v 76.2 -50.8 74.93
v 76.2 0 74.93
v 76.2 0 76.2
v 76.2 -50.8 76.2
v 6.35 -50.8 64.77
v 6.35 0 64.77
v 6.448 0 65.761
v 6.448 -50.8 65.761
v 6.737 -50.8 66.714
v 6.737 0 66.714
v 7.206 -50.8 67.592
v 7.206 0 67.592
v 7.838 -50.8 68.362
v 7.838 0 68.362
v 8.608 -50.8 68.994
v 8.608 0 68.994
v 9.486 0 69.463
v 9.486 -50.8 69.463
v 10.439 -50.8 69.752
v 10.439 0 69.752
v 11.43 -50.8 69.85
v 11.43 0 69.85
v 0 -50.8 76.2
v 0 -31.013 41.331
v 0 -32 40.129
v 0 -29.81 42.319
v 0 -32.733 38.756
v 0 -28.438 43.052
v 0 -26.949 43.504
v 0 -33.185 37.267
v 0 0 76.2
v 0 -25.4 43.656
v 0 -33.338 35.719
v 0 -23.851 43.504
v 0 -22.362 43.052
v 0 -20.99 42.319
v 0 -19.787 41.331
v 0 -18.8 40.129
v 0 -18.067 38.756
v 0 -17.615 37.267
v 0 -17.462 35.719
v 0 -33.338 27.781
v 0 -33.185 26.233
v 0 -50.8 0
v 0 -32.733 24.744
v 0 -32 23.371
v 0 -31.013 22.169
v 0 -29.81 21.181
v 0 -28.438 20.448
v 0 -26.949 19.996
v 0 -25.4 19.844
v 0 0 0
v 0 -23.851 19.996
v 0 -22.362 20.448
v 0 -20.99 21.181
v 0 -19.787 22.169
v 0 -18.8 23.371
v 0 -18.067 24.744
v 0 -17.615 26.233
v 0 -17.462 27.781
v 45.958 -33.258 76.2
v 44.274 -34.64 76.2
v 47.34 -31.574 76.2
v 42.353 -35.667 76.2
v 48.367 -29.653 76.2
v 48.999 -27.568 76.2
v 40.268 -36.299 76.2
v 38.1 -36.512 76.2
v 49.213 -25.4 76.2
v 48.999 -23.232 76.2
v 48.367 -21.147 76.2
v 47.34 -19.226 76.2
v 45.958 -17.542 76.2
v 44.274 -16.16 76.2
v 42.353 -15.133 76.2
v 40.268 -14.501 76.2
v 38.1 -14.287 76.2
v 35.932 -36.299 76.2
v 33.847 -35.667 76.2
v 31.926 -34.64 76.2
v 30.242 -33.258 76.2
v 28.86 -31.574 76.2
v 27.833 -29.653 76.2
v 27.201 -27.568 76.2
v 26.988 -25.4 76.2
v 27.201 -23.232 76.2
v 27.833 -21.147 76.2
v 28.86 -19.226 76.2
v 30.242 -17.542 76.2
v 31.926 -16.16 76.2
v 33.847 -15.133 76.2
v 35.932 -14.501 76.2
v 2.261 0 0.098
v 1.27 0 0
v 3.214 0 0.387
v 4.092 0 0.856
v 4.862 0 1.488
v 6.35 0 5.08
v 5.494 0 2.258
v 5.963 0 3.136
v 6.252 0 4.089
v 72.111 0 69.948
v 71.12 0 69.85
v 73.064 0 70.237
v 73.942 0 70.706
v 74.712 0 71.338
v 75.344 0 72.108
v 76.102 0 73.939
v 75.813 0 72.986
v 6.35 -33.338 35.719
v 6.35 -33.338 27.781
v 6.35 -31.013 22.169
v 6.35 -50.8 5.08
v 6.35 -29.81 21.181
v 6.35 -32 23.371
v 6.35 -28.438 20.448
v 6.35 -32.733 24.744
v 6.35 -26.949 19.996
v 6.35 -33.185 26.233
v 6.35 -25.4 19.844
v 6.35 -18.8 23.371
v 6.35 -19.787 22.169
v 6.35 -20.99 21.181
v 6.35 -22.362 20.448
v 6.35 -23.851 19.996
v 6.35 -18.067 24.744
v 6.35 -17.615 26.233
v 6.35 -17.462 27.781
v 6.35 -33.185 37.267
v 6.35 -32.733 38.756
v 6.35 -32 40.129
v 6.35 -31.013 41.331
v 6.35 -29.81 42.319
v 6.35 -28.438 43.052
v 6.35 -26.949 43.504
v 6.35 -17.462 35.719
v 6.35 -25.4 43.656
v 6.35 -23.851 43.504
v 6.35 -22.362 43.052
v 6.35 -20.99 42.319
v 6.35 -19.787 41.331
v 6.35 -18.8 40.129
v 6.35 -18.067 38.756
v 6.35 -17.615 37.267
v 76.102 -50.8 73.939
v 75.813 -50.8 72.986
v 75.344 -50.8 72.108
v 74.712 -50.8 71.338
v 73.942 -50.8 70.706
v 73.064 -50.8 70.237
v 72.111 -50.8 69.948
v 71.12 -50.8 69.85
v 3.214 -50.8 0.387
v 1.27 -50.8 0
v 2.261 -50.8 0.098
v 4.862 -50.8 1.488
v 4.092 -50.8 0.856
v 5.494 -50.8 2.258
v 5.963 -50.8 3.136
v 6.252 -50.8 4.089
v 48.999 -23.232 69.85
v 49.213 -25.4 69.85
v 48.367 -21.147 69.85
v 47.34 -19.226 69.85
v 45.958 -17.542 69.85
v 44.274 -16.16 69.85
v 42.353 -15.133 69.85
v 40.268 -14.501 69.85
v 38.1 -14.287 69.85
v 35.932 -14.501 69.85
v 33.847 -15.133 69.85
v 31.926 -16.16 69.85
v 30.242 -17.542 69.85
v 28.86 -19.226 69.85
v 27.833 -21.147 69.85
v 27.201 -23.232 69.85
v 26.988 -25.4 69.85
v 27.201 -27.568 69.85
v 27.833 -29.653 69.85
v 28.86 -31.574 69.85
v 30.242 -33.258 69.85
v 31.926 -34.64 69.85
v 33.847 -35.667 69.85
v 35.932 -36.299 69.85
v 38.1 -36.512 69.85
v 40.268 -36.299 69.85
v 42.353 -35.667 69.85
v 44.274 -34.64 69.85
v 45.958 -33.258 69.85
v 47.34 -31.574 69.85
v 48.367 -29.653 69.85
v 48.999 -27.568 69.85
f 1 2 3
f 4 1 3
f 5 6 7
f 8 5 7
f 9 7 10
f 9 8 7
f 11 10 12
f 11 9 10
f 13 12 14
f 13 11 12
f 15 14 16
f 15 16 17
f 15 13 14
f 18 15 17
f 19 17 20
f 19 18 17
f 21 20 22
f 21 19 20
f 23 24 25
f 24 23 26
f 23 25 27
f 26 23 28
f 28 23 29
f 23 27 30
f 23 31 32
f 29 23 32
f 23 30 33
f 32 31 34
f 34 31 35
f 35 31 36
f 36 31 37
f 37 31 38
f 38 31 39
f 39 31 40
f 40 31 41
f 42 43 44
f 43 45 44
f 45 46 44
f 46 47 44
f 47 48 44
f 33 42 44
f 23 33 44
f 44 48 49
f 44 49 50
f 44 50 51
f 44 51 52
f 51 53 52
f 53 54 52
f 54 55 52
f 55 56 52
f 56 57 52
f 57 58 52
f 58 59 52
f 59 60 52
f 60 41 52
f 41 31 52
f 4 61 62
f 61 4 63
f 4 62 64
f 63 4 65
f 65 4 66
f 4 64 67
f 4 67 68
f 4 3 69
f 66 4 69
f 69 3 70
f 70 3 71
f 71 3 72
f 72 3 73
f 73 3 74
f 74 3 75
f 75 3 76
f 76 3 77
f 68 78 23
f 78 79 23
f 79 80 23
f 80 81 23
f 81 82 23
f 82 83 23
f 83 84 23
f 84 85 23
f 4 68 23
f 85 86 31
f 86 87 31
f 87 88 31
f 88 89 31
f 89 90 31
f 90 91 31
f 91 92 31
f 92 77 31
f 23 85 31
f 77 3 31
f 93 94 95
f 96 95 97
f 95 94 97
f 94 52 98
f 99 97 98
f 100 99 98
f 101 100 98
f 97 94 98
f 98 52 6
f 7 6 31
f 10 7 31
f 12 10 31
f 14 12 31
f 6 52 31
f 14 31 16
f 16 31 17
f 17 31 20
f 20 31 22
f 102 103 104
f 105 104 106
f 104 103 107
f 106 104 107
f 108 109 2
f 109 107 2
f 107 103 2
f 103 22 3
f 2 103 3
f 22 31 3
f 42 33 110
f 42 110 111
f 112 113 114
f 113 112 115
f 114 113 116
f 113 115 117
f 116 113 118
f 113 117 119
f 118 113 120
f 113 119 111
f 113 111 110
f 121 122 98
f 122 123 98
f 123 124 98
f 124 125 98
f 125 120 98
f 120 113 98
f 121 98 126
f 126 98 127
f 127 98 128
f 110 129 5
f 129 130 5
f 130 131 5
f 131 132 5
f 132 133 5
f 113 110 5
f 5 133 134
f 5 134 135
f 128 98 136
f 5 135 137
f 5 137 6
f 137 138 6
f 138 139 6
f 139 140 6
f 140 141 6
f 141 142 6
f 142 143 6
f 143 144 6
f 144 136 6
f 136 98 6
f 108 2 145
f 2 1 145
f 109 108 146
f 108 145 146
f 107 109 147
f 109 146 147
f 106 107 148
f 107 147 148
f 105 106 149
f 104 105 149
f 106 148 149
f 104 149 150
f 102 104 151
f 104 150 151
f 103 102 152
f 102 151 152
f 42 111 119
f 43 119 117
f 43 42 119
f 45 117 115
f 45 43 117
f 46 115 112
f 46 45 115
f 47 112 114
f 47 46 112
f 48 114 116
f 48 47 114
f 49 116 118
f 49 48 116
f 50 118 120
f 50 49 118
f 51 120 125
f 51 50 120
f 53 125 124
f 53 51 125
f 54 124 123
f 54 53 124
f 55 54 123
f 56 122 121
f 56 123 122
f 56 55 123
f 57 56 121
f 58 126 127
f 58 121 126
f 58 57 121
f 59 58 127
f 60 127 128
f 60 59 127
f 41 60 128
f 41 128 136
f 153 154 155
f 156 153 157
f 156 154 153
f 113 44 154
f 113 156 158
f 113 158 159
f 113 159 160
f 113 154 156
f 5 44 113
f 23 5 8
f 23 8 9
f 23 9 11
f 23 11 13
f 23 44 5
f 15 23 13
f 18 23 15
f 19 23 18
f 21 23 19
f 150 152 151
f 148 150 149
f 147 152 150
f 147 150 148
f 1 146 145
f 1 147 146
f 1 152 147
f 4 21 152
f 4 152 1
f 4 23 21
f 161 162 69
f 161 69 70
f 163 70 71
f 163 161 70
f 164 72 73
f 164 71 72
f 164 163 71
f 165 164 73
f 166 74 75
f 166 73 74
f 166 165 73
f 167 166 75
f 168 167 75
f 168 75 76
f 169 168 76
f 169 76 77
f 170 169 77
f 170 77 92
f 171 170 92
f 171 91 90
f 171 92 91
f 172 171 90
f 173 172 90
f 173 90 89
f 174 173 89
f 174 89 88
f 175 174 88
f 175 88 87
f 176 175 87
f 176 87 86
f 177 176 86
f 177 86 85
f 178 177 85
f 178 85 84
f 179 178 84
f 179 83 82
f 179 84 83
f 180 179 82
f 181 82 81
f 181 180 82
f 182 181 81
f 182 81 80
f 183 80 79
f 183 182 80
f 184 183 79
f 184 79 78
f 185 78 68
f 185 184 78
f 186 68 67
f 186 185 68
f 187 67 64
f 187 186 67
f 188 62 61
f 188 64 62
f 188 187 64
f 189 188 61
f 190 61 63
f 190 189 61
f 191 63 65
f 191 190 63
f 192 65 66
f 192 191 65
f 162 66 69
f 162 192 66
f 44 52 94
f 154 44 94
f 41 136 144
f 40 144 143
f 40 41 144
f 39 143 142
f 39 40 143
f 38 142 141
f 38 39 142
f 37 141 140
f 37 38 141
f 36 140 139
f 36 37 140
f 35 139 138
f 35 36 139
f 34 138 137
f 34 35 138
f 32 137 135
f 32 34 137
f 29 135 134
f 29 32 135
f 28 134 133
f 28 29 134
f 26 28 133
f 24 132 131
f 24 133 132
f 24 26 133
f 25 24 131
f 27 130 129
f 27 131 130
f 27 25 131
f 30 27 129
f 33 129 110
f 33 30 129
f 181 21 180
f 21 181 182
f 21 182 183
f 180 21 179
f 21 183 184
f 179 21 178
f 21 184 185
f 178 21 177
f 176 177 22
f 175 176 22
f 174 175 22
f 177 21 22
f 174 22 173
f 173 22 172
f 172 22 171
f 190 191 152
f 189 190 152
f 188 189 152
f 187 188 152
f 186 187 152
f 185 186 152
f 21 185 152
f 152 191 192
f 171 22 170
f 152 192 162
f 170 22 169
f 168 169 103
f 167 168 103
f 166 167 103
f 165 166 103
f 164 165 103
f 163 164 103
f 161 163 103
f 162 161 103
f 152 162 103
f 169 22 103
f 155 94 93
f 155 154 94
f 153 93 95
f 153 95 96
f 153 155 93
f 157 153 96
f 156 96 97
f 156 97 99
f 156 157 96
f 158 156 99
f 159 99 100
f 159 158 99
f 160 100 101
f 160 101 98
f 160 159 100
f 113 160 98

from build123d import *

# Parameters (mm, degrees)
F1_DEPTH  = 50.8
F3_DEPTH  = 76.201
F4_R      = 11.1125
F1_FACE_W = 76.2
F1_FACE_H = 50.8
F5_DEPTH  = 76.201
F6_R      = 5.08


with BuildPart() as f1:
    # F0 (on Front) → F1 (new body)
    with BuildSketch(Plane.XZ):
        Polygon((0, 76.2), (0, 0), (6.35, 0), (6.35, 69.85), (76.2, 69.85), (76.2, 76.2), align=None)
    extrude(amount=F1_DEPTH)

    # F2 (on Right) → F3 (cut, through all)
    with BuildSketch(Plane.YZ):
        with BuildLine():
            Line((-33.3375, 31.75), (-33.3375, 27.78125))
            ThreePointArc((-33.3375, 27.78125), (-25.4, 19.84375), (-17.4625, 27.78125))
            Line((-17.4625, 27.78125), (-17.4625, 31.75))
            Line((-17.4625, 31.75), (-33.3375, 31.75))
        make_face()
        with BuildLine():
            Line((-33.3375, 35.71875), (-33.3375, 31.75))
            Line((-33.3375, 31.75), (-17.4625, 31.75))
            Line((-17.4625, 31.75), (-17.4625, 35.71875))
            ThreePointArc((-17.4625, 35.71875), (-25.4, 43.65625), (-33.3375, 35.71875))
        make_face()
    extrude(amount=F3_DEPTH, mode=Mode.SUBTRACT)

    # F4 (on Top) + F1_face (on face) → F5 (cut, through all)
    with BuildSketch(Plane.XY):
        with Locations((38.1, -25.4)):
            Circle(F4_R)
    with BuildSketch(Plane(origin=(38.1, -25.4, 76.2), x_dir=(1, 0, 0), z_dir=(0, 0, 1))):
        Rectangle(F1_FACE_W, F1_FACE_H)
    extrude(amount=F5_DEPTH, mode=Mode.SUBTRACT)

    # F6
    f6_edges = [f1.edges().sort_by_distance(p)[0] for p in [
        (6.35, -25.4, 69.85),
        (76.2, -25.4, 69.85),
        (6.35, -25.4, 0),
    ]]
    fillet(f6_edges, radius=F6_R)


solid = f1.part
